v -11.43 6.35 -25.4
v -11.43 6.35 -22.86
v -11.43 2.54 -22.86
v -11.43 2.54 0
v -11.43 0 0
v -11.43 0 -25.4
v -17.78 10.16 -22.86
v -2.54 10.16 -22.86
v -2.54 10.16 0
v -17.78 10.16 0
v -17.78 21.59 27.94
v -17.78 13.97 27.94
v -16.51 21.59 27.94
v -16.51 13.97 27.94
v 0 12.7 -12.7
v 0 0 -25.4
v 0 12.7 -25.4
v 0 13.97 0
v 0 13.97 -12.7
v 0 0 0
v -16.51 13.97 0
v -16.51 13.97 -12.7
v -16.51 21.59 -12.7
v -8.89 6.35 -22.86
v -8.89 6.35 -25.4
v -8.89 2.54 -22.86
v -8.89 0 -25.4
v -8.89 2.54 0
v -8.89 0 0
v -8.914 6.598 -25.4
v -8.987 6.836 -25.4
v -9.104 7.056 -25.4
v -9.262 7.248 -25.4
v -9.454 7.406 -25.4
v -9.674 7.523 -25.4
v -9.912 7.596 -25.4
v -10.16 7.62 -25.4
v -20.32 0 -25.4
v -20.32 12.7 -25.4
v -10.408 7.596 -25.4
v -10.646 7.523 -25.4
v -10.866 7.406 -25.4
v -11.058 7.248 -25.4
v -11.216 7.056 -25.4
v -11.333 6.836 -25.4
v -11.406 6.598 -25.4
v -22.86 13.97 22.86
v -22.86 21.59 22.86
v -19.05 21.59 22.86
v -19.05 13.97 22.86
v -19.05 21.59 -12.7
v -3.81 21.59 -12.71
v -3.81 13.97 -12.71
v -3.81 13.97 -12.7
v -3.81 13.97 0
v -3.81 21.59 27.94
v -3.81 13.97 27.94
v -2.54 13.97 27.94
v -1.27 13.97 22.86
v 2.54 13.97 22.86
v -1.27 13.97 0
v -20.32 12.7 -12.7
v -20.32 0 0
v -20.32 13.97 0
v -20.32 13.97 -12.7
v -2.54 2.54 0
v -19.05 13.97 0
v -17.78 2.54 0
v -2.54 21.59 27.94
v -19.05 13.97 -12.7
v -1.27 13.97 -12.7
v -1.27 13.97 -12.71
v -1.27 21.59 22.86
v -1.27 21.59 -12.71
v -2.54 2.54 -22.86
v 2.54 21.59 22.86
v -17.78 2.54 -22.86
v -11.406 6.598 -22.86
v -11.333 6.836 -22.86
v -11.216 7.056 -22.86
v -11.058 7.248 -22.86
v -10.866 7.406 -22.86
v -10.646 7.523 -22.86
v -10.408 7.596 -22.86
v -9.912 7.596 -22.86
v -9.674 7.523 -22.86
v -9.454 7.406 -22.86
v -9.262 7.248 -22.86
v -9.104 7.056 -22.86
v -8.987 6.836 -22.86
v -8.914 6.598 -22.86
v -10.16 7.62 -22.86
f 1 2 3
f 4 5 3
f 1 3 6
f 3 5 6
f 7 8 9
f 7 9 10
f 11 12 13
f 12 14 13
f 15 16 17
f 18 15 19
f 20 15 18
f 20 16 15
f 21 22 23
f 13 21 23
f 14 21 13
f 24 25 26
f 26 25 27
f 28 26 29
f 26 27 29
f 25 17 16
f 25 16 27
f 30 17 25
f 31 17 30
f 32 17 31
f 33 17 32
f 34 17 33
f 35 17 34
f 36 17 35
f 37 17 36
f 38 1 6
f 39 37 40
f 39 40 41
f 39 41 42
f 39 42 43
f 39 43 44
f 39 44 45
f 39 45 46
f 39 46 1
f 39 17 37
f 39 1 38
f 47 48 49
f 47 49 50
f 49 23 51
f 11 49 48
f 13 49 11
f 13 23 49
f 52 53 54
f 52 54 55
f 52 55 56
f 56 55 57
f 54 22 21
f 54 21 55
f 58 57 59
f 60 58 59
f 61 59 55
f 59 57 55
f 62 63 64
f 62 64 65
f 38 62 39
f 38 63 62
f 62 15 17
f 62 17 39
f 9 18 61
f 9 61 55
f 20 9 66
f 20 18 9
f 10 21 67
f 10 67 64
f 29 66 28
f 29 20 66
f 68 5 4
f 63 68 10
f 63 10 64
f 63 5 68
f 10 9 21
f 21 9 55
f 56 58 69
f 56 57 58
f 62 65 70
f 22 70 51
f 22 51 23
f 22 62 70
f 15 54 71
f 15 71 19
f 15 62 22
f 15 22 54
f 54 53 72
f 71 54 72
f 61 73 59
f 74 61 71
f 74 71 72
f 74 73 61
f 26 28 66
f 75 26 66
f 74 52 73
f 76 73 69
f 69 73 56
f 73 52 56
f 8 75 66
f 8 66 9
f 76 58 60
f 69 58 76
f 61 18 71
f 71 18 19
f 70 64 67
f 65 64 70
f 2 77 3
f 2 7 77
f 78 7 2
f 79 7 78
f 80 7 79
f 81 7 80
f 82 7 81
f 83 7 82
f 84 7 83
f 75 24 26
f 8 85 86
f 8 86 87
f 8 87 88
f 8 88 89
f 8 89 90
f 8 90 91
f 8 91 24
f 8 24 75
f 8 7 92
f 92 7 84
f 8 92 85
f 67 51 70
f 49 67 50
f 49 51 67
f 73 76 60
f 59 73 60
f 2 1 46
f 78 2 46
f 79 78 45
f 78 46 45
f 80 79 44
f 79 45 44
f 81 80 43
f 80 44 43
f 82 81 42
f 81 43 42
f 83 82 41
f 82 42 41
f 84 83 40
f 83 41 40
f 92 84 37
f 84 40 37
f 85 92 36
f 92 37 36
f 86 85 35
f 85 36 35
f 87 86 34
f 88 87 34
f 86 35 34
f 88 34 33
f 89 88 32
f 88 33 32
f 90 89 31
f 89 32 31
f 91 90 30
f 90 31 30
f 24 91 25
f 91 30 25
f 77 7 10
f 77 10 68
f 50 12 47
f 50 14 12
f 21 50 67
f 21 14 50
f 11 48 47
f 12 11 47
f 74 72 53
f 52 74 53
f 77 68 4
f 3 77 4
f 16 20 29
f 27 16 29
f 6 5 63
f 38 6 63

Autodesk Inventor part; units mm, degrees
ref_plane "YZ Plane" through (0, 0, 0) normal (1, 0, 0) x (0, 1, 0)
ref_plane "XZ Plane" through (0, 0, 0) normal (0, 1, 0) x (-1, 0, 0)
ref_plane "XY Plane" through (0, 0, 0) normal (0, 0, 1) x (1, 0, 0)
sketch "Sketch1" plane through (0, 0, 0) normal (0, 1, 0) x (-1, 0, 0)
  line L0 (0, 0) -> (20.32, 0)
  line L1 (20.32, 0) -> (20.32, -27.94)
  line L2 (20.32, -27.94) -> (0, -27.94)
  line L3 (0, -27.94) -> (0, 0)
  dimension "d0" = 20.32
  dimension "d1" = 27.94
extrude "Extrusion1" add sketch "Sketch1" along normal blind 12.7
sketch "Sketch2" plane through (-20.32, 0, 0) normal (0, 0, 1) x (1, 0, 0)
  line L0 (2.54, 2.54) -> (17.78, 2.54)
  line L1 (17.78, 2.54) -> (17.78, 10.16)
  line L2 (17.78, 10.16) -> (2.54, 10.16)
  line L3 (2.54, 10.16) -> (2.54, 2.54)
  point P0 (0, 0)
  dimension "d6" = 15.24
  dimension "d7" = 7.62
extrude "Extrusion2" cut sketch "Sketch2" against normal blind 22.86
sketch "Sketch3" plane through (0, 0, -27.94) normal (0, 0, -1) x (-1, 0, 0)
  line L0 (0, 0) -> (0, 12.7) projected
  line L1 (0, 0) -> (20.32, 0) projected
  line L2 (0, 12.7) -> (20.32, 12.7)
  line L3 (20.32, 12.7) -> (20.32, 0)
  line L4 (20.32, 0) -> (0, 0)
  line L5 (0, 0) -> (0, 12.7)
extrude "Extrusion3" cut sketch "Sketch3" against normal blind 2.54
sketch "Sketch4" plane through (0, 0, 0) normal (0, -1, 0) x (1, 0, 0)
  line L0 (-8.89, 0) -> (-11.43, 0)
  line L1 (-11.43, 0) -> (-11.43, -25.4)
  line L2 (-11.43, -25.4) -> (-8.89, -25.4)
  line L3 (-8.89, -25.4) -> (-8.89, 0)
  line L4 (-20.32, 0) -> (-20.32, -25.4) projected
  line L5 (0, -25.4) -> (0, 0) projected
  dimension "d12" = 8.89
  dimension "d32" = 8.89
sketch "Sketch5" plane through (0, 0, -25.4) normal (0, 0, -1) x (-1, 0, 0)
  line L0 (0, 0) -> (20.32, 0) projected
  line L1 (10.16, 0) -> (10.16, 6.35)
  circle A0 centre (10.16, 6.35) radius 1.27
  dimension "d14" = 6.35
  dimension "d15" = 2.54
extrude "Extrusion4" cut sketch "Sketch5" against normal blind 2.54
extrude "Extrusion5" cut sketch "Sketch4" against normal blind 6.35
sketch "Sketch8" plane through (0, 12.7, 0) normal (0, 1, 0) x (1, 0, 0)
  line L0 (0, 25.4) -> (0, 0) projected
  line L1 (-20.32, 0) -> (-20.32, 25.4) projected
  line L2 (0, 0) -> (-20.32, 0)
  line L3 (-20.32, 0) -> (-20.32, 12.7)
  line L4 (-20.32, 12.7) -> (0, 12.7)
  line L5 (0, 12.7) -> (0, 0)
extrude "Extrusion8" add sketch "Sketch8" along normal blind 2.54
sketch "Sketch9" plane through (-17.78, 10.16, 0) normal (0, 0, 1) x (1, 0, 0)
  arc A0 (8.89, -3.81) -> (6.35, -3.81) centre (7.62, -3.81) ccw projected
  line L0 (7.62, -3.81) -> (7.62, 7.62)
  point P0 (17.78, -10.16)
  dimension "d36" = 11.43
sketch "Sketch10" plane through (0, 15.24, 0) normal (0, 1, 0) x (1, 0, 0)
  line L0 (-11.43, 0) -> (-20.32, 0) projected
  line L1 (-20.32, 0) -> (0, 0)
  line L2 (0, 0) -> (0, 12.7)
  line L3 (0, 12.7) -> (-20.32, 12.7)
  line L4 (-20.32, 12.7) -> (-20.32, 0)
extrude "Extrusion9" cut sketch "Sketch10" against normal blind 1.27
sketch "Sketch11" plane through (0, 13.97, 0) normal (0, 1, 0) x (1, 0, 0)
  point P0 (0, 0)
sketch "Sketch12" plane through (0, 13.97, 0) normal (0, 1, 0) x (1, 0, 0)
  line L0 (-17.78, 0) -> (-2.54, 0) projected
  line L1 (-10.16, 0) -> (-10.16, 12.7099)
  line L2 (-10.16, 0) -> (-16.51, 0)
  line L3 (-11.43, 0) -> (-20.32, 0) projected
  line L4 (-10.16, 0) -> (-3.81, 0)
  line L5 (-3.81, 0) -> (0, 0)
  line L6 (0, 0) -> (0, 12.7099)
  line L7 (0, 12.7099) -> (-3.81, 12.7099)
  line L8 (-3.81, 12.7099) -> (-3.81, 0)
  line L9 (-20.32, 0) -> (-20.32, 12.7) projected
  line L10 (-16.51, 0) -> (-20.32, 0)
  line L11 (-20.32, 0) -> (-20.32, 12.7)
  line L12 (-20.32, 12.7) -> (-16.51, 12.7)
  line L13 (-16.51, 12.7) -> (-16.51, 0)
  dimension "d39" = 6.35
  dimension "d40" = 6.35
extrude "Extrusion10" add sketch "Sketch12" along normal blind 7.62
sketch "Sketch13" plane through (-17.78, 10.16, 0) normal (0, 0, 1) x (1, 0, 0)
  line L0 (17.78, 3.81) -> (17.78, 11.43) projected
  line L1 (1.27, 3.81) -> (13.97, 3.81) projected
  line L2 (17.78, 11.43) -> (13.97, 11.43)
  line L3 (13.97, 11.43) -> (13.97, 3.81)
  line L4 (13.97, 3.81) -> (17.78, 3.81)
  line L5 (17.78, 3.81) -> (17.78, 11.43)
  line L6 (1.27, 11.43) -> (-2.54, 11.43) projected
  line L7 (-2.54, 2.54) -> (-2.54, 11.43) projected
  line L8 (1.27, 11.43) -> (-2.54, 11.43)
  line L9 (-2.54, 11.43) -> (-2.54, 3.81)
  line L10 (-2.54, 3.81) -> (1.27, 3.81)
  line L11 (1.27, 3.81) -> (1.27, 11.43)
  point P0 (17.78, -10.16)
extrude "Extrusion11" add sketch "Sketch13" along normal blind 27.94
sketch "Sketch14" plane through (0, 0, 0) normal (1, 0, 0) x (0, 0, -1)
  line L0 (-27.94, 13.97) -> (-27.94, 21.59) projected
  line L1 (12.7, 21.59) -> (-27.94, 21.59) projected
  line L2 (-27.94, 13.97) -> (-22.86, 13.97)
  line L3 (-22.86, 13.97) -> (-22.86, 21.59)
  line L4 (-22.86, 21.59) -> (-27.94, 21.59)
  line L5 (-27.94, 21.59) -> (-27.94, 13.97)
  point P0 (0, 0)
  dimension "d45" = 5.08
sketch "Sketch15" plane through (0, 21.59, 0) normal (0, 1, 0) x (1, 0, 0)
  point P0 (0, 0)
extrude "Extrusion12" add sketch "Sketch14" along normal blind 2.54
sketch "Sketch16" plane through (-20.32, 0, -25.4) normal (-1, 0, 0) x (0, 0, 1)
  line L0 (48.26, 21.59) -> (53.34, 21.59) projected
  line L1 (53.34, 13.97) -> (48.26, 13.97) projected
  line L2 (53.34, 21.59) -> (48.26, 21.59)
  line L3 (48.26, 21.59) -> (48.26, 13.97)
  line L4 (48.26, 13.97) -> (53.34, 13.97)
  line L5 (53.34, 13.97) -> (53.34, 21.59)
  point P0 (25.4, 0)
extrude "Extrusion13" add sketch "Sketch16" along normal blind 2.54
chamfer "Chamfer3" distance 5.08 angle 45 1 edges at (-22.86, 17.78, 27.94)
chamfer "Chamfer4" distance 5.08 angle 45 1 edges at (2.54, 17.78, 27.94)
sketch "Sketch17" plane through (-20.32, 0, -25.4) normal (-1, 0, 0) x (0, 0, 1)
  line L0 (12.7, 12.7) -> (12.7, 21.59) projected
  line L1 (25.4, 13.97) -> (48.26, 13.97) projected
  line L2 (12.7, 21.59) -> (48.26, 21.59)
  line L3 (48.26, 21.59) -> (48.26, 13.97)
  line L4 (48.26, 13.97) -> (12.7, 13.97)
  line L5 (12.7, 13.97) -> (12.7, 21.59)
  point P0 (25.4, 0)
extrude "Extrusion14" cut sketch "Sketch17" against normal blind 1.27
sketch "Sketch18" plane through (0, 0, 0) normal (1, 0, 0) x (0, 0, -1)
  line L0 (12.7099, 13.97) -> (12.7099, 21.59) projected
  line L1 (0, 13.97) -> (-22.86, 13.97) projected
  line L2 (12.7099, 21.59) -> (-22.86, 21.59)
  line L3 (-22.86, 21.59) -> (-22.86, 13.97)
  line L4 (-22.86, 13.97) -> (12.7099, 13.97)
  line L5 (12.7099, 13.97) -> (12.7099, 21.59)
  point P0 (0, 0)
extrude "Extrusion15" cut sketch "Sketch18" against normal blind 1.27
properties part number "Small USB Cover"
